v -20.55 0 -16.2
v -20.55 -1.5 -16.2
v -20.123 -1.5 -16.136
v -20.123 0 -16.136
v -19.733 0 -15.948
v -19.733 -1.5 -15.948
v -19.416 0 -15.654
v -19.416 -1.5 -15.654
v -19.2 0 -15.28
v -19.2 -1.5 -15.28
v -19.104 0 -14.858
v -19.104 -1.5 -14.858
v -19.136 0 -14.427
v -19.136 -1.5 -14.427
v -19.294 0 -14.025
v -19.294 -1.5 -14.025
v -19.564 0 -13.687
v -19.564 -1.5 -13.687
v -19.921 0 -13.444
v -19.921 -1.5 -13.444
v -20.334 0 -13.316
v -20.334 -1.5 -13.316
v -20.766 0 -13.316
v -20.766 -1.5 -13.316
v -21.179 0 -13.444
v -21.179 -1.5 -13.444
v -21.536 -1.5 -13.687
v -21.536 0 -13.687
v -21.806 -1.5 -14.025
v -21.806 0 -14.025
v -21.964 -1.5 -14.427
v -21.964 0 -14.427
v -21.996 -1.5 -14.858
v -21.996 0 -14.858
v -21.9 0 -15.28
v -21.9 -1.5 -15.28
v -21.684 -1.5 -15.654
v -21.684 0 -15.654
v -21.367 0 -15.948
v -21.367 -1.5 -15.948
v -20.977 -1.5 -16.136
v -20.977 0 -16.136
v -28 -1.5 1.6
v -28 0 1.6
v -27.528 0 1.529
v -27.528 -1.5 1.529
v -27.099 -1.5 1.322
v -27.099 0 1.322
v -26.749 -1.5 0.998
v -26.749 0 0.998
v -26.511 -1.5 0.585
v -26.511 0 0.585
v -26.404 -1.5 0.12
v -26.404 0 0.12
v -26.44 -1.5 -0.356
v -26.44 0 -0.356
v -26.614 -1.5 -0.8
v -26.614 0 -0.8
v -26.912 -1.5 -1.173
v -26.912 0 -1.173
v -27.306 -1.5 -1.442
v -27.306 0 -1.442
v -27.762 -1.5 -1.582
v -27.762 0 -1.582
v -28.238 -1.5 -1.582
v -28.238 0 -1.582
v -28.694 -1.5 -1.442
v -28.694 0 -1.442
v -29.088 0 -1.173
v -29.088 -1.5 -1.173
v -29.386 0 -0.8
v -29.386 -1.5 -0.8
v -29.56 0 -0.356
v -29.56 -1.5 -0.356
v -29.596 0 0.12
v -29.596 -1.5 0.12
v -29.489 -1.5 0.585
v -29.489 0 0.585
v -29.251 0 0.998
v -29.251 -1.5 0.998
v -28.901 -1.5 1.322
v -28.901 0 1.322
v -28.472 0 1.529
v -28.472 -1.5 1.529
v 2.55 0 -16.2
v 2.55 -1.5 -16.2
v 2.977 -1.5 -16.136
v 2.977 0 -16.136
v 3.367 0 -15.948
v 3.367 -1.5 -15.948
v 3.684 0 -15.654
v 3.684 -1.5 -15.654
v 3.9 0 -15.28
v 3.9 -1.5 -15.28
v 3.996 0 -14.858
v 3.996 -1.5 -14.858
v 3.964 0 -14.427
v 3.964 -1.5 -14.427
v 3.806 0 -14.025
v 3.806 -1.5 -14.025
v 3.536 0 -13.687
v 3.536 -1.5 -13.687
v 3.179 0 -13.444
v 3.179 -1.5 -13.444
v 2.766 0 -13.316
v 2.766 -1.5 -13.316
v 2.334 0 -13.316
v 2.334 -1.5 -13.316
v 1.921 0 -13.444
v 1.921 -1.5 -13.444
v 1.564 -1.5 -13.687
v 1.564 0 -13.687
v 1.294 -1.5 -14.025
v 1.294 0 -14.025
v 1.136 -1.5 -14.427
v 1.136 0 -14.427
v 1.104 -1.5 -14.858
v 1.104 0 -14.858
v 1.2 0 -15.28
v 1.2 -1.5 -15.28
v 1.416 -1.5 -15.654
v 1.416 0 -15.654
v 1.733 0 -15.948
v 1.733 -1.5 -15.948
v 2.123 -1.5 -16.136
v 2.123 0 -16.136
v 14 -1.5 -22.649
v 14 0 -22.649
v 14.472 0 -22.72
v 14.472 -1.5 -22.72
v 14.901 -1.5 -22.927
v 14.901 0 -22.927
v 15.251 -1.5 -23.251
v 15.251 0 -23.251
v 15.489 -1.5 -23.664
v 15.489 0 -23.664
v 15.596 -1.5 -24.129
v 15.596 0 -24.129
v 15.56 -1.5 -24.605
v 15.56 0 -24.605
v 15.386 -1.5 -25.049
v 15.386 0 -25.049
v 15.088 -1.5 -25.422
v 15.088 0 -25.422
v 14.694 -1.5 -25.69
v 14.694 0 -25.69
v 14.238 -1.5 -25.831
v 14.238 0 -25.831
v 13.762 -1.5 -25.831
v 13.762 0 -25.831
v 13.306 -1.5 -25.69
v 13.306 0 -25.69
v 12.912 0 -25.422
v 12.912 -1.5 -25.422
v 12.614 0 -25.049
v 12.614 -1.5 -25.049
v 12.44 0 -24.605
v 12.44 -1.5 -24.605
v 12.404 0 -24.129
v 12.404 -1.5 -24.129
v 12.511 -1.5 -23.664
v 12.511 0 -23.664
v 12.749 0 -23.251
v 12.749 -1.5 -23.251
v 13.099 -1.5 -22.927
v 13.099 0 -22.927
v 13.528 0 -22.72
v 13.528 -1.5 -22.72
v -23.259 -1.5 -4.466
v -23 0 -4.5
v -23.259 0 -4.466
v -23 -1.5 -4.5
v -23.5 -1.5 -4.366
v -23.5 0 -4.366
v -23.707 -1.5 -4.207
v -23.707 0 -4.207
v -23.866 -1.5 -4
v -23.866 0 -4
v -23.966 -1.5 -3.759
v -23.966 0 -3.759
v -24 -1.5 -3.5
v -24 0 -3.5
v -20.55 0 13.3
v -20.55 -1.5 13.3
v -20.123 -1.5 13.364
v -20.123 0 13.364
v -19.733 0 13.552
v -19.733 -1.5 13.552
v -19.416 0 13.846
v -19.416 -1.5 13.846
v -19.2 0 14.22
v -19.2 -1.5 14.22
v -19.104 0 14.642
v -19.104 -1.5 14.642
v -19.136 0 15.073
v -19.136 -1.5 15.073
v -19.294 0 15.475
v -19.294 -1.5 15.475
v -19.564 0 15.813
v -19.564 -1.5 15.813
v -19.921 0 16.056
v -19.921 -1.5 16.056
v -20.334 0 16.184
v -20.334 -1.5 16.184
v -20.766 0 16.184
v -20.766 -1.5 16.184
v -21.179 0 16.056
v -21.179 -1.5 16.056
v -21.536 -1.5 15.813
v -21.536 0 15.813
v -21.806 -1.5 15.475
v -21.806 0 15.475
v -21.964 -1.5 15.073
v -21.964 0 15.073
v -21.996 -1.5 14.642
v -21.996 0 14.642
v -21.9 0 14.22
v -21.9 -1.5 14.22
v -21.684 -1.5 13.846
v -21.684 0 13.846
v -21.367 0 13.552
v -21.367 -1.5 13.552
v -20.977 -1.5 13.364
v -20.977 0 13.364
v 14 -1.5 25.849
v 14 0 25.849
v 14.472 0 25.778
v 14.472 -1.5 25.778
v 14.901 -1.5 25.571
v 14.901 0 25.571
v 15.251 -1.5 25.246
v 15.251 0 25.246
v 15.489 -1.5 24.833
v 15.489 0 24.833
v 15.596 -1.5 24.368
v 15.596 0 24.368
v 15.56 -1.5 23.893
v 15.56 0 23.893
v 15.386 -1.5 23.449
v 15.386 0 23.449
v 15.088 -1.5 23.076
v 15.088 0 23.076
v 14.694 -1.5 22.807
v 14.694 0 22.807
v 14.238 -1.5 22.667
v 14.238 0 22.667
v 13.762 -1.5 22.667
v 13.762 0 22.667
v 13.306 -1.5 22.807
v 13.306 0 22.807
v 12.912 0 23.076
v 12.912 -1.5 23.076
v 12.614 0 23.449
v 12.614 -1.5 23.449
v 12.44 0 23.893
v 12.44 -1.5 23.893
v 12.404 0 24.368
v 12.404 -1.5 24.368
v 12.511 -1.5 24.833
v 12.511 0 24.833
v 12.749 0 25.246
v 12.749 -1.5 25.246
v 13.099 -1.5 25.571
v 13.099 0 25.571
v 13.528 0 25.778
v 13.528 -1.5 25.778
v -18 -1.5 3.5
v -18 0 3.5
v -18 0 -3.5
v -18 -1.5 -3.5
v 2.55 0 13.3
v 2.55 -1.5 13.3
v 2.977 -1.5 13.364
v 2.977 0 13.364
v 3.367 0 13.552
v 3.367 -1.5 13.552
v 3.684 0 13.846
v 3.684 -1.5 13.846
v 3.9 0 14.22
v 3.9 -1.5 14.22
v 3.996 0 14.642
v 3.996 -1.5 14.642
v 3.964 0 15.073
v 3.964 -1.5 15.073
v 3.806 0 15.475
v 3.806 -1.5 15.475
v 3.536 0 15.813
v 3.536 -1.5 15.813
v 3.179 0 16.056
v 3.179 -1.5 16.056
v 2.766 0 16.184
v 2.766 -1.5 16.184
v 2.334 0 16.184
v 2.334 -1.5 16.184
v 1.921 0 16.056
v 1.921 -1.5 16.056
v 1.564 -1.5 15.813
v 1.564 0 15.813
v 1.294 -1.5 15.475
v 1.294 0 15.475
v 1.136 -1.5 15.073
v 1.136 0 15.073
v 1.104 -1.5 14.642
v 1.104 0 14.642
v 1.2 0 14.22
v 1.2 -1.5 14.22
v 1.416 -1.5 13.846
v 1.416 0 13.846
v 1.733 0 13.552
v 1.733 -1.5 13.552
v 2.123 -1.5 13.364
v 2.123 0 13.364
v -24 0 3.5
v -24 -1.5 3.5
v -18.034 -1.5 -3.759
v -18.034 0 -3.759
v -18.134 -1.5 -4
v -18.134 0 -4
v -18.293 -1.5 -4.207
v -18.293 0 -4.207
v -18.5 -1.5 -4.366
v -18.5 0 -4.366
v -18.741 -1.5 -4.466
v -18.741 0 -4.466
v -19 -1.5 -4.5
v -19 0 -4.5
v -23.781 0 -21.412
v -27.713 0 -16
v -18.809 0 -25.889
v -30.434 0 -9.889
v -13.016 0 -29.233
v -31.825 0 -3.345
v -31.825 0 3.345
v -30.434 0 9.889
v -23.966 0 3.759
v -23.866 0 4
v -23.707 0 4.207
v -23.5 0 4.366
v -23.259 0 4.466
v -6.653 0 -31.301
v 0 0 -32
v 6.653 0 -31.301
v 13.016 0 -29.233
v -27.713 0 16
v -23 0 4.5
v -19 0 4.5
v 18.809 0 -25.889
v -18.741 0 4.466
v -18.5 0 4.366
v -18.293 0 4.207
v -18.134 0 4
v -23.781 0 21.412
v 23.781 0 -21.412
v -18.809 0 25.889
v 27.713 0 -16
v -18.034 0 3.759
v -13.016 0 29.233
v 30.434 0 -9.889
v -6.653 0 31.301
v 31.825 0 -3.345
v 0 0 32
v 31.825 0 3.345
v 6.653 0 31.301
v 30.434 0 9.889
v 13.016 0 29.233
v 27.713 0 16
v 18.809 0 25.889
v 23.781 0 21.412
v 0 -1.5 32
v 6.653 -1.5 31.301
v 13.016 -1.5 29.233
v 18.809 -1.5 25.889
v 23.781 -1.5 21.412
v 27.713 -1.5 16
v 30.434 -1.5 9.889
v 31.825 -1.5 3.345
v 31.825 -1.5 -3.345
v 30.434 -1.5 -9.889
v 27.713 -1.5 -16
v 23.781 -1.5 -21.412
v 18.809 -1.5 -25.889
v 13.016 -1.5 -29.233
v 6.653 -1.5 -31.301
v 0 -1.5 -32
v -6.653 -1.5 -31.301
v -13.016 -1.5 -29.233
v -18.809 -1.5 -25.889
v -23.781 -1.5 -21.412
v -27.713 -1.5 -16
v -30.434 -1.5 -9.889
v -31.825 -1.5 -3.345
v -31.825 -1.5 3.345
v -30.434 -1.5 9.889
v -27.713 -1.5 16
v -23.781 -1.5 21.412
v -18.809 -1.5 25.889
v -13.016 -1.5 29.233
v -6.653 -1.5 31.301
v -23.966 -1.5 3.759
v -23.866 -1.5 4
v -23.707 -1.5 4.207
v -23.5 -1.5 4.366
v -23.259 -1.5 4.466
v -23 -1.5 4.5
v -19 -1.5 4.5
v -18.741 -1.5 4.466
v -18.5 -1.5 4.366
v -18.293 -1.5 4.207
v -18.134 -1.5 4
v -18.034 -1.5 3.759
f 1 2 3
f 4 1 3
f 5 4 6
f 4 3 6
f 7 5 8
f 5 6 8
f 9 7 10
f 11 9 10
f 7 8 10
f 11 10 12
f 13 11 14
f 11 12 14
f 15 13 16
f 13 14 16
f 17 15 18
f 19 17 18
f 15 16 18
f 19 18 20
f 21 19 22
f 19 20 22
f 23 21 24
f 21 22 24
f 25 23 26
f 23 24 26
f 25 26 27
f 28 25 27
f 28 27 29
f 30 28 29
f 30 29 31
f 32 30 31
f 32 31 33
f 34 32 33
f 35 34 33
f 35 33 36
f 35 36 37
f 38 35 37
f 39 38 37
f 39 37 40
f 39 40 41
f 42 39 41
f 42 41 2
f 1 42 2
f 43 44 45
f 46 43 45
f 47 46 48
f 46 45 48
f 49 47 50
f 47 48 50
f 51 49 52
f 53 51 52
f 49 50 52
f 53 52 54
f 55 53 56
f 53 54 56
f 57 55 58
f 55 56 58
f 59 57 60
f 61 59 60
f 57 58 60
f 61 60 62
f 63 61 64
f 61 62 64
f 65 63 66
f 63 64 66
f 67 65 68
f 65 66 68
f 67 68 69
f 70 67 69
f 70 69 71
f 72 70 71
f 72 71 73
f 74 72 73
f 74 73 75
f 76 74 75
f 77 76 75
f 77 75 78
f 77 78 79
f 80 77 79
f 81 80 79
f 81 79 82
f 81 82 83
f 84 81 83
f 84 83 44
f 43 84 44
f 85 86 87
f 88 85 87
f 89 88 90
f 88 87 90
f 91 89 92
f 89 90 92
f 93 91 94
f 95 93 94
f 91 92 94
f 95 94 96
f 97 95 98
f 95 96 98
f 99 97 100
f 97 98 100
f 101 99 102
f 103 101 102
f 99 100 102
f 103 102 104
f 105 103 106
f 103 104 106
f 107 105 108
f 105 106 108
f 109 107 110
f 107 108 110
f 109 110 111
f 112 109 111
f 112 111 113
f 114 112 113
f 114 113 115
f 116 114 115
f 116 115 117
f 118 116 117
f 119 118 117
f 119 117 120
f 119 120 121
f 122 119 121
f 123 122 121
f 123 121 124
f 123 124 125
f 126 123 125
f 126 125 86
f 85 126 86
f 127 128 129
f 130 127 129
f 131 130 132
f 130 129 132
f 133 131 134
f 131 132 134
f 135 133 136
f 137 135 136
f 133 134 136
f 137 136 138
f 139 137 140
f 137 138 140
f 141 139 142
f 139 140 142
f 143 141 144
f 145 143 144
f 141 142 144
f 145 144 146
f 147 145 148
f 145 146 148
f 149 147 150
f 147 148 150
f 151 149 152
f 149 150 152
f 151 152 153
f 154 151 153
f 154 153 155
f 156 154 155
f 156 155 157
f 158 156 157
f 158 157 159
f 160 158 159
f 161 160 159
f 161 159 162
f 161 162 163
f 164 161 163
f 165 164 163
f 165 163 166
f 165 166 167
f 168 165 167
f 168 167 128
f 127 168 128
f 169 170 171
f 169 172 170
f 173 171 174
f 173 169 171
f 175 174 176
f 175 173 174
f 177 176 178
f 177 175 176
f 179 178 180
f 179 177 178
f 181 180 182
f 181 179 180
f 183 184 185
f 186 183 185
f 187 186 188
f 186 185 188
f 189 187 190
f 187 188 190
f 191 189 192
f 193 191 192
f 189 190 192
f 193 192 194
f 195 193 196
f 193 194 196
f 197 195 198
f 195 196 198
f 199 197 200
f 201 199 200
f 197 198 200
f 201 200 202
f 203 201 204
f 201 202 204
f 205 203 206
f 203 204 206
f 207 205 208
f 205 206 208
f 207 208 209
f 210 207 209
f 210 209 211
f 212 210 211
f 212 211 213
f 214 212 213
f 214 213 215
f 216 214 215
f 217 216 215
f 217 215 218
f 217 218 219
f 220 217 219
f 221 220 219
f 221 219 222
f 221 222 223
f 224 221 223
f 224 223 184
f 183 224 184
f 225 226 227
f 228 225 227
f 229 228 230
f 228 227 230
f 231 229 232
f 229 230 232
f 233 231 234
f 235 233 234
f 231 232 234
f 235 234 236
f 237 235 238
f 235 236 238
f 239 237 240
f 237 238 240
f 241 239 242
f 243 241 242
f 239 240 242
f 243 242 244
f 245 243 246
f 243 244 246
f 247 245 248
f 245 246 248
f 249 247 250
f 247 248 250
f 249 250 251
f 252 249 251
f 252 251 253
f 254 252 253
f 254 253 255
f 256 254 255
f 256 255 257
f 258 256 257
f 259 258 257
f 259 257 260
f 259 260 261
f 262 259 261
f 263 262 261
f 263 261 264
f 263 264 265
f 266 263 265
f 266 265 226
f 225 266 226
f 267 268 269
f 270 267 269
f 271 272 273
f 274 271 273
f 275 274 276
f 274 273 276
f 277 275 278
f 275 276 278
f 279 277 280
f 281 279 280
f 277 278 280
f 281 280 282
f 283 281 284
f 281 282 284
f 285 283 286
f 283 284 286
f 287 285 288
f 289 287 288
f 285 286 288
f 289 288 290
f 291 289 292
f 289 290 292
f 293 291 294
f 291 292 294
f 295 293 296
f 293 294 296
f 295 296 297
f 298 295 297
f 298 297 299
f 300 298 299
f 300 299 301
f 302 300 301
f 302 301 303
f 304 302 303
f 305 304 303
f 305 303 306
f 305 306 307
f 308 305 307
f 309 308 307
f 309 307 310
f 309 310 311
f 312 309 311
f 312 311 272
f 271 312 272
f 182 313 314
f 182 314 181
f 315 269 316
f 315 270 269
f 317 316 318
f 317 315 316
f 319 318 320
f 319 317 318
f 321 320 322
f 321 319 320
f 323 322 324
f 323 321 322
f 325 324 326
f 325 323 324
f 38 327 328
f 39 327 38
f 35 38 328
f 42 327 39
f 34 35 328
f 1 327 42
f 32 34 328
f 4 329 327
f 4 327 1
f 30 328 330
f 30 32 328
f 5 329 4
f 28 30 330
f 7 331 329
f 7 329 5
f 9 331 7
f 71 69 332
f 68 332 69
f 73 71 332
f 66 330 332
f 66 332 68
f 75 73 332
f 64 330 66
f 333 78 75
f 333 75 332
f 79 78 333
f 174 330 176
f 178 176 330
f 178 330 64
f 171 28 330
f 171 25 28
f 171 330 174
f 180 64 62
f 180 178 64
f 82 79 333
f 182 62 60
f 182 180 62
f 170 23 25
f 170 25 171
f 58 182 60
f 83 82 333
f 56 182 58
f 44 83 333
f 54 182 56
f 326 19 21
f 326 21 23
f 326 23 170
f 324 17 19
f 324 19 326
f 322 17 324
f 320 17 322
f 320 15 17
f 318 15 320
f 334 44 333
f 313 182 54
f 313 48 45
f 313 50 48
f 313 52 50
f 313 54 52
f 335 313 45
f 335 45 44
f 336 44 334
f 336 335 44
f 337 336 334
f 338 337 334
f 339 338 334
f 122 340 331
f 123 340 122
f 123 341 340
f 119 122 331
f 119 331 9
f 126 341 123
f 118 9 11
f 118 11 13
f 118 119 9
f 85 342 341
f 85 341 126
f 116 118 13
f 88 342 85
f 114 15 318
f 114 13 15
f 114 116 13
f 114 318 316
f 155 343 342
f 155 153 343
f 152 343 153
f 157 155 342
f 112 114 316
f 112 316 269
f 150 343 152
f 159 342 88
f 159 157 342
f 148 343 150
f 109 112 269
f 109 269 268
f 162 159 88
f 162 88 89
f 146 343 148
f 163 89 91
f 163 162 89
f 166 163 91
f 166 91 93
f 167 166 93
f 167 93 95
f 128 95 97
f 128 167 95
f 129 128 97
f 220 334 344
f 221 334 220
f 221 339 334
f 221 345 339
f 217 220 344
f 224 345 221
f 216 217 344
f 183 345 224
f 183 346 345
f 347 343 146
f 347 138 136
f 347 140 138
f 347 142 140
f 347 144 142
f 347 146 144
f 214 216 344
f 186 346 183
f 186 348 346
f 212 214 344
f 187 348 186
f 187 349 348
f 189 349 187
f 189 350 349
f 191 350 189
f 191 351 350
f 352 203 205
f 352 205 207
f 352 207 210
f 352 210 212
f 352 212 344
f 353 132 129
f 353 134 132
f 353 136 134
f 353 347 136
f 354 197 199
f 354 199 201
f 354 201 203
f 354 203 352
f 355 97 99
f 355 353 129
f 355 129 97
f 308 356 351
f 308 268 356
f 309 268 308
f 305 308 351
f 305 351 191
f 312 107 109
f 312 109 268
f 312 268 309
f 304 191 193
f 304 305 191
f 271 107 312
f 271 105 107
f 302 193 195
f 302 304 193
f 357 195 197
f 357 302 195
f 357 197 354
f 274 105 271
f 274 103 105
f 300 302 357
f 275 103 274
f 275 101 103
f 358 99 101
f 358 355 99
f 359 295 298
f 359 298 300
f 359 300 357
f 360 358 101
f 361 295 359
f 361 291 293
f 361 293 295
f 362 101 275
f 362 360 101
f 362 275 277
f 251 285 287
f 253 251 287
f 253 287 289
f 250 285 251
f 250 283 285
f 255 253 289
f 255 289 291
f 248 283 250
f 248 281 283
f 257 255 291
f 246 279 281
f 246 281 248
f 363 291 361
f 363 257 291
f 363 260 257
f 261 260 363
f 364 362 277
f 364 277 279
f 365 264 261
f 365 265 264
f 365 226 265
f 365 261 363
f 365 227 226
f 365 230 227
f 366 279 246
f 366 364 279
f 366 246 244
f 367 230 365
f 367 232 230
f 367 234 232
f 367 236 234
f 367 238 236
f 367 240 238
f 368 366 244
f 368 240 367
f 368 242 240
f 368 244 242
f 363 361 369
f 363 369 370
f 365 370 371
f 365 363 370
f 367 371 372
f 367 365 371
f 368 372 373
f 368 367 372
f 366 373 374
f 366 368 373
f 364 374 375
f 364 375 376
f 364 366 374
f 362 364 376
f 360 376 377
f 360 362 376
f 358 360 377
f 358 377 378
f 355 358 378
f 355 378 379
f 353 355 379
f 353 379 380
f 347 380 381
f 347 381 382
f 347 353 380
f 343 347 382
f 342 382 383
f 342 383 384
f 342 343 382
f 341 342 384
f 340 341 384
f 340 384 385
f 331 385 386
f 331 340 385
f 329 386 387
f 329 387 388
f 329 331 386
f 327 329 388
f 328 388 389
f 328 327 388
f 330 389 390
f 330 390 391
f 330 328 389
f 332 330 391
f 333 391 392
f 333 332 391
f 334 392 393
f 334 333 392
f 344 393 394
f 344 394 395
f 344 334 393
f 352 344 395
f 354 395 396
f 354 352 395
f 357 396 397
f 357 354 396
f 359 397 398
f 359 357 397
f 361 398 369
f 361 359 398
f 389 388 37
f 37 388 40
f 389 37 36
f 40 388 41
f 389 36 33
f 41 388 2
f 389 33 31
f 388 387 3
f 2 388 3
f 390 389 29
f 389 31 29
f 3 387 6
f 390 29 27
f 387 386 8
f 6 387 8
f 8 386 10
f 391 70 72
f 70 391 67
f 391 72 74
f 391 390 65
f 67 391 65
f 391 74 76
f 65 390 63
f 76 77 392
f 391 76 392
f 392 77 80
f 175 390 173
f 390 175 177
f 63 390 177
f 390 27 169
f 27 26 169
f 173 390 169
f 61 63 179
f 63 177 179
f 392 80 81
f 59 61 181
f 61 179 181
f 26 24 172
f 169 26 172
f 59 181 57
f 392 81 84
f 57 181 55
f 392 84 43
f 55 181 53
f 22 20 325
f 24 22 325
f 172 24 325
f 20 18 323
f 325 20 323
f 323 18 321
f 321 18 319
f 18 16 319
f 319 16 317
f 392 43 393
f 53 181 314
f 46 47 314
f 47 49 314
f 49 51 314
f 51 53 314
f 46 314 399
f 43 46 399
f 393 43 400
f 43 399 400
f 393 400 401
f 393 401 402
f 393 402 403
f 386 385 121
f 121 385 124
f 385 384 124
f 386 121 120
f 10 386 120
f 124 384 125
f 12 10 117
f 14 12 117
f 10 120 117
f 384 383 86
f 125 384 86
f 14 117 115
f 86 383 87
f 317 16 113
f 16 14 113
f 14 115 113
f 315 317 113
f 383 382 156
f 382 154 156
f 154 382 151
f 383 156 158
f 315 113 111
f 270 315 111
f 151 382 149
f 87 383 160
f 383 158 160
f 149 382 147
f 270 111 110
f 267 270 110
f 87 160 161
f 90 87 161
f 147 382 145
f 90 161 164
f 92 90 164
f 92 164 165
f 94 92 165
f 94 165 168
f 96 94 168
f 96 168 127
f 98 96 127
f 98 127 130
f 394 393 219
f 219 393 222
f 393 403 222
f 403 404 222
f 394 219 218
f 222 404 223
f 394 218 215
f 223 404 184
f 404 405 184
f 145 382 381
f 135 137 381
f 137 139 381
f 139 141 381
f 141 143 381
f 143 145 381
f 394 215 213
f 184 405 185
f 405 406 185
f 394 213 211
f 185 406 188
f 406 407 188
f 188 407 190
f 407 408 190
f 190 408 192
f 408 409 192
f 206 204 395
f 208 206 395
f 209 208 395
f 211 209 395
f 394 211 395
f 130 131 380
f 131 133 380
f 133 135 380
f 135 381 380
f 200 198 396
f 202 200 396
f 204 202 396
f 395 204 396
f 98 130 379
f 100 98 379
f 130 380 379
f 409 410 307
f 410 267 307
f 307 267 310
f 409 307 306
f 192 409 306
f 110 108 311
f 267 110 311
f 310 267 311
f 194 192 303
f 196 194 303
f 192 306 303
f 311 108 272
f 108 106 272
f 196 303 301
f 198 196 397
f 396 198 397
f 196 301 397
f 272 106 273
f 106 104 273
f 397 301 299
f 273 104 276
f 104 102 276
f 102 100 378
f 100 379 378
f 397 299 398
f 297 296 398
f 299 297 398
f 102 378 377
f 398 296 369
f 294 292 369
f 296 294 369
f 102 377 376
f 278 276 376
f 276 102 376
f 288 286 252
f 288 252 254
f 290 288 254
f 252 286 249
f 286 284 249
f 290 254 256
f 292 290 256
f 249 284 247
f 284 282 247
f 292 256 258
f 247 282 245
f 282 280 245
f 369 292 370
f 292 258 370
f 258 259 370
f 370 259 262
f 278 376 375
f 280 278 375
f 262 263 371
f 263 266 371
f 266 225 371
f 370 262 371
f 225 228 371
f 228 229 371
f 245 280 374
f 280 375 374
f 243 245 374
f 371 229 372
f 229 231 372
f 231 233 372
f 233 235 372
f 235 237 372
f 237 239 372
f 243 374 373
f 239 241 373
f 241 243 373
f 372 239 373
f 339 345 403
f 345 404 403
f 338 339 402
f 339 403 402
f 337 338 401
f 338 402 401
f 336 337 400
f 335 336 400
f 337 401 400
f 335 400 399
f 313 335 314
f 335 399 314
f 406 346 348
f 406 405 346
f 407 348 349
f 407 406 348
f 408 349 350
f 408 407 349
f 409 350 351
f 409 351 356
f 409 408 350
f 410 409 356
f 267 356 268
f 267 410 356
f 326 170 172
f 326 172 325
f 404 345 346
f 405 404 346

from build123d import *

# Parameters (mm, degrees)
SKETCH1_R          = 32
BASE_FLANGE1_DEPTH = 1.5
SKETCH6_R          = 1.6
CUT_EXTRUDE1_DEPTH = 46.279686395
SKETCH7_W          = 6
SKETCH7_H          = 9
CUT_EXTRUDE2_DEPTH = 46.279686395
FILLET1_R          = 1
SKETCH8_R          = 1.45
CUT_EXTRUDE3_DEPTH = 46.279686395


# Sheet-metal steps are written as plain solids
with BuildPart() as part:
    # Sketch1 → Base-Flange1 (new body)
    with BuildSketch(Plane(origin=(0, 0, 0), x_dir=(1, 0, 0), z_dir=(0, 1, 0))):
        with Locations(Location((0, 0, 0), (0, 0, 270))):
            Circle(SKETCH1_R)
    extrude(amount=-BASE_FLANGE1_DEPTH)

    # Sketch6 → Cut-Extrude1 (cut, through all)
    with BuildSketch(Plane(origin=(0, 0, 0), x_dir=(1, 0, 0), z_dir=(0, 1, 0))):
        with Locations(Location((-28, 0, 0), (0, 0, 270))):
            Circle(SKETCH6_R)
        with Locations(Location((14, 24.248711306, 0), (0, 0, 270))):
            Circle(SKETCH6_R)
        with Locations(Location((14, -24.248711306, 0), (0, 0, 270))):
            Circle(SKETCH6_R)
    extrude(amount=-CUT_EXTRUDE1_DEPTH, mode=Mode.SUBTRACT)

    # Sketch7 → Cut-Extrude2 (cut, through all)
    with BuildSketch(Plane(origin=(0, 0, 0), x_dir=(1, 0, 0), z_dir=(0, 1, 0))):
        with Locations((-21, 0)):
            Rectangle(SKETCH7_W, SKETCH7_H)
    extrude(amount=-CUT_EXTRUDE2_DEPTH, mode=Mode.SUBTRACT)

    # Fillet1
    fillet1_edges = [part.edges().sort_by_distance(p)[0] for p in [
        (-18, -0.75, -4.5),
        (-18, -0.75, 4.5),
        (-24, -0.75, 4.5),
        (-24, -0.75, -4.5),
    ]]
    fillet(fillet1_edges, radius=FILLET1_R)

    # Sketch8 → Cut-Extrude3 (cut, through all)
    with BuildSketch(Plane.XZ.offset(1.5)):
        with Locations(Location((2.55, -14.75, 0), (0, 0, 270))):
            Circle(SKETCH8_R)
        with Locations(Location((2.55, 14.75, 0), (0, 0, 270))):
            Circle(SKETCH8_R)
        with Locations(Location((-20.55, 14.75, 0), (0, 0, 270))):
            Circle(SKETCH8_R)
        with Locations(Location((-20.55, -14.75, 0), (0, 0, 270))):
            Circle(SKETCH8_R)
    extrude(amount=-CUT_EXTRUDE3_DEPTH, mode=Mode.SUBTRACT)


solid = part.part
